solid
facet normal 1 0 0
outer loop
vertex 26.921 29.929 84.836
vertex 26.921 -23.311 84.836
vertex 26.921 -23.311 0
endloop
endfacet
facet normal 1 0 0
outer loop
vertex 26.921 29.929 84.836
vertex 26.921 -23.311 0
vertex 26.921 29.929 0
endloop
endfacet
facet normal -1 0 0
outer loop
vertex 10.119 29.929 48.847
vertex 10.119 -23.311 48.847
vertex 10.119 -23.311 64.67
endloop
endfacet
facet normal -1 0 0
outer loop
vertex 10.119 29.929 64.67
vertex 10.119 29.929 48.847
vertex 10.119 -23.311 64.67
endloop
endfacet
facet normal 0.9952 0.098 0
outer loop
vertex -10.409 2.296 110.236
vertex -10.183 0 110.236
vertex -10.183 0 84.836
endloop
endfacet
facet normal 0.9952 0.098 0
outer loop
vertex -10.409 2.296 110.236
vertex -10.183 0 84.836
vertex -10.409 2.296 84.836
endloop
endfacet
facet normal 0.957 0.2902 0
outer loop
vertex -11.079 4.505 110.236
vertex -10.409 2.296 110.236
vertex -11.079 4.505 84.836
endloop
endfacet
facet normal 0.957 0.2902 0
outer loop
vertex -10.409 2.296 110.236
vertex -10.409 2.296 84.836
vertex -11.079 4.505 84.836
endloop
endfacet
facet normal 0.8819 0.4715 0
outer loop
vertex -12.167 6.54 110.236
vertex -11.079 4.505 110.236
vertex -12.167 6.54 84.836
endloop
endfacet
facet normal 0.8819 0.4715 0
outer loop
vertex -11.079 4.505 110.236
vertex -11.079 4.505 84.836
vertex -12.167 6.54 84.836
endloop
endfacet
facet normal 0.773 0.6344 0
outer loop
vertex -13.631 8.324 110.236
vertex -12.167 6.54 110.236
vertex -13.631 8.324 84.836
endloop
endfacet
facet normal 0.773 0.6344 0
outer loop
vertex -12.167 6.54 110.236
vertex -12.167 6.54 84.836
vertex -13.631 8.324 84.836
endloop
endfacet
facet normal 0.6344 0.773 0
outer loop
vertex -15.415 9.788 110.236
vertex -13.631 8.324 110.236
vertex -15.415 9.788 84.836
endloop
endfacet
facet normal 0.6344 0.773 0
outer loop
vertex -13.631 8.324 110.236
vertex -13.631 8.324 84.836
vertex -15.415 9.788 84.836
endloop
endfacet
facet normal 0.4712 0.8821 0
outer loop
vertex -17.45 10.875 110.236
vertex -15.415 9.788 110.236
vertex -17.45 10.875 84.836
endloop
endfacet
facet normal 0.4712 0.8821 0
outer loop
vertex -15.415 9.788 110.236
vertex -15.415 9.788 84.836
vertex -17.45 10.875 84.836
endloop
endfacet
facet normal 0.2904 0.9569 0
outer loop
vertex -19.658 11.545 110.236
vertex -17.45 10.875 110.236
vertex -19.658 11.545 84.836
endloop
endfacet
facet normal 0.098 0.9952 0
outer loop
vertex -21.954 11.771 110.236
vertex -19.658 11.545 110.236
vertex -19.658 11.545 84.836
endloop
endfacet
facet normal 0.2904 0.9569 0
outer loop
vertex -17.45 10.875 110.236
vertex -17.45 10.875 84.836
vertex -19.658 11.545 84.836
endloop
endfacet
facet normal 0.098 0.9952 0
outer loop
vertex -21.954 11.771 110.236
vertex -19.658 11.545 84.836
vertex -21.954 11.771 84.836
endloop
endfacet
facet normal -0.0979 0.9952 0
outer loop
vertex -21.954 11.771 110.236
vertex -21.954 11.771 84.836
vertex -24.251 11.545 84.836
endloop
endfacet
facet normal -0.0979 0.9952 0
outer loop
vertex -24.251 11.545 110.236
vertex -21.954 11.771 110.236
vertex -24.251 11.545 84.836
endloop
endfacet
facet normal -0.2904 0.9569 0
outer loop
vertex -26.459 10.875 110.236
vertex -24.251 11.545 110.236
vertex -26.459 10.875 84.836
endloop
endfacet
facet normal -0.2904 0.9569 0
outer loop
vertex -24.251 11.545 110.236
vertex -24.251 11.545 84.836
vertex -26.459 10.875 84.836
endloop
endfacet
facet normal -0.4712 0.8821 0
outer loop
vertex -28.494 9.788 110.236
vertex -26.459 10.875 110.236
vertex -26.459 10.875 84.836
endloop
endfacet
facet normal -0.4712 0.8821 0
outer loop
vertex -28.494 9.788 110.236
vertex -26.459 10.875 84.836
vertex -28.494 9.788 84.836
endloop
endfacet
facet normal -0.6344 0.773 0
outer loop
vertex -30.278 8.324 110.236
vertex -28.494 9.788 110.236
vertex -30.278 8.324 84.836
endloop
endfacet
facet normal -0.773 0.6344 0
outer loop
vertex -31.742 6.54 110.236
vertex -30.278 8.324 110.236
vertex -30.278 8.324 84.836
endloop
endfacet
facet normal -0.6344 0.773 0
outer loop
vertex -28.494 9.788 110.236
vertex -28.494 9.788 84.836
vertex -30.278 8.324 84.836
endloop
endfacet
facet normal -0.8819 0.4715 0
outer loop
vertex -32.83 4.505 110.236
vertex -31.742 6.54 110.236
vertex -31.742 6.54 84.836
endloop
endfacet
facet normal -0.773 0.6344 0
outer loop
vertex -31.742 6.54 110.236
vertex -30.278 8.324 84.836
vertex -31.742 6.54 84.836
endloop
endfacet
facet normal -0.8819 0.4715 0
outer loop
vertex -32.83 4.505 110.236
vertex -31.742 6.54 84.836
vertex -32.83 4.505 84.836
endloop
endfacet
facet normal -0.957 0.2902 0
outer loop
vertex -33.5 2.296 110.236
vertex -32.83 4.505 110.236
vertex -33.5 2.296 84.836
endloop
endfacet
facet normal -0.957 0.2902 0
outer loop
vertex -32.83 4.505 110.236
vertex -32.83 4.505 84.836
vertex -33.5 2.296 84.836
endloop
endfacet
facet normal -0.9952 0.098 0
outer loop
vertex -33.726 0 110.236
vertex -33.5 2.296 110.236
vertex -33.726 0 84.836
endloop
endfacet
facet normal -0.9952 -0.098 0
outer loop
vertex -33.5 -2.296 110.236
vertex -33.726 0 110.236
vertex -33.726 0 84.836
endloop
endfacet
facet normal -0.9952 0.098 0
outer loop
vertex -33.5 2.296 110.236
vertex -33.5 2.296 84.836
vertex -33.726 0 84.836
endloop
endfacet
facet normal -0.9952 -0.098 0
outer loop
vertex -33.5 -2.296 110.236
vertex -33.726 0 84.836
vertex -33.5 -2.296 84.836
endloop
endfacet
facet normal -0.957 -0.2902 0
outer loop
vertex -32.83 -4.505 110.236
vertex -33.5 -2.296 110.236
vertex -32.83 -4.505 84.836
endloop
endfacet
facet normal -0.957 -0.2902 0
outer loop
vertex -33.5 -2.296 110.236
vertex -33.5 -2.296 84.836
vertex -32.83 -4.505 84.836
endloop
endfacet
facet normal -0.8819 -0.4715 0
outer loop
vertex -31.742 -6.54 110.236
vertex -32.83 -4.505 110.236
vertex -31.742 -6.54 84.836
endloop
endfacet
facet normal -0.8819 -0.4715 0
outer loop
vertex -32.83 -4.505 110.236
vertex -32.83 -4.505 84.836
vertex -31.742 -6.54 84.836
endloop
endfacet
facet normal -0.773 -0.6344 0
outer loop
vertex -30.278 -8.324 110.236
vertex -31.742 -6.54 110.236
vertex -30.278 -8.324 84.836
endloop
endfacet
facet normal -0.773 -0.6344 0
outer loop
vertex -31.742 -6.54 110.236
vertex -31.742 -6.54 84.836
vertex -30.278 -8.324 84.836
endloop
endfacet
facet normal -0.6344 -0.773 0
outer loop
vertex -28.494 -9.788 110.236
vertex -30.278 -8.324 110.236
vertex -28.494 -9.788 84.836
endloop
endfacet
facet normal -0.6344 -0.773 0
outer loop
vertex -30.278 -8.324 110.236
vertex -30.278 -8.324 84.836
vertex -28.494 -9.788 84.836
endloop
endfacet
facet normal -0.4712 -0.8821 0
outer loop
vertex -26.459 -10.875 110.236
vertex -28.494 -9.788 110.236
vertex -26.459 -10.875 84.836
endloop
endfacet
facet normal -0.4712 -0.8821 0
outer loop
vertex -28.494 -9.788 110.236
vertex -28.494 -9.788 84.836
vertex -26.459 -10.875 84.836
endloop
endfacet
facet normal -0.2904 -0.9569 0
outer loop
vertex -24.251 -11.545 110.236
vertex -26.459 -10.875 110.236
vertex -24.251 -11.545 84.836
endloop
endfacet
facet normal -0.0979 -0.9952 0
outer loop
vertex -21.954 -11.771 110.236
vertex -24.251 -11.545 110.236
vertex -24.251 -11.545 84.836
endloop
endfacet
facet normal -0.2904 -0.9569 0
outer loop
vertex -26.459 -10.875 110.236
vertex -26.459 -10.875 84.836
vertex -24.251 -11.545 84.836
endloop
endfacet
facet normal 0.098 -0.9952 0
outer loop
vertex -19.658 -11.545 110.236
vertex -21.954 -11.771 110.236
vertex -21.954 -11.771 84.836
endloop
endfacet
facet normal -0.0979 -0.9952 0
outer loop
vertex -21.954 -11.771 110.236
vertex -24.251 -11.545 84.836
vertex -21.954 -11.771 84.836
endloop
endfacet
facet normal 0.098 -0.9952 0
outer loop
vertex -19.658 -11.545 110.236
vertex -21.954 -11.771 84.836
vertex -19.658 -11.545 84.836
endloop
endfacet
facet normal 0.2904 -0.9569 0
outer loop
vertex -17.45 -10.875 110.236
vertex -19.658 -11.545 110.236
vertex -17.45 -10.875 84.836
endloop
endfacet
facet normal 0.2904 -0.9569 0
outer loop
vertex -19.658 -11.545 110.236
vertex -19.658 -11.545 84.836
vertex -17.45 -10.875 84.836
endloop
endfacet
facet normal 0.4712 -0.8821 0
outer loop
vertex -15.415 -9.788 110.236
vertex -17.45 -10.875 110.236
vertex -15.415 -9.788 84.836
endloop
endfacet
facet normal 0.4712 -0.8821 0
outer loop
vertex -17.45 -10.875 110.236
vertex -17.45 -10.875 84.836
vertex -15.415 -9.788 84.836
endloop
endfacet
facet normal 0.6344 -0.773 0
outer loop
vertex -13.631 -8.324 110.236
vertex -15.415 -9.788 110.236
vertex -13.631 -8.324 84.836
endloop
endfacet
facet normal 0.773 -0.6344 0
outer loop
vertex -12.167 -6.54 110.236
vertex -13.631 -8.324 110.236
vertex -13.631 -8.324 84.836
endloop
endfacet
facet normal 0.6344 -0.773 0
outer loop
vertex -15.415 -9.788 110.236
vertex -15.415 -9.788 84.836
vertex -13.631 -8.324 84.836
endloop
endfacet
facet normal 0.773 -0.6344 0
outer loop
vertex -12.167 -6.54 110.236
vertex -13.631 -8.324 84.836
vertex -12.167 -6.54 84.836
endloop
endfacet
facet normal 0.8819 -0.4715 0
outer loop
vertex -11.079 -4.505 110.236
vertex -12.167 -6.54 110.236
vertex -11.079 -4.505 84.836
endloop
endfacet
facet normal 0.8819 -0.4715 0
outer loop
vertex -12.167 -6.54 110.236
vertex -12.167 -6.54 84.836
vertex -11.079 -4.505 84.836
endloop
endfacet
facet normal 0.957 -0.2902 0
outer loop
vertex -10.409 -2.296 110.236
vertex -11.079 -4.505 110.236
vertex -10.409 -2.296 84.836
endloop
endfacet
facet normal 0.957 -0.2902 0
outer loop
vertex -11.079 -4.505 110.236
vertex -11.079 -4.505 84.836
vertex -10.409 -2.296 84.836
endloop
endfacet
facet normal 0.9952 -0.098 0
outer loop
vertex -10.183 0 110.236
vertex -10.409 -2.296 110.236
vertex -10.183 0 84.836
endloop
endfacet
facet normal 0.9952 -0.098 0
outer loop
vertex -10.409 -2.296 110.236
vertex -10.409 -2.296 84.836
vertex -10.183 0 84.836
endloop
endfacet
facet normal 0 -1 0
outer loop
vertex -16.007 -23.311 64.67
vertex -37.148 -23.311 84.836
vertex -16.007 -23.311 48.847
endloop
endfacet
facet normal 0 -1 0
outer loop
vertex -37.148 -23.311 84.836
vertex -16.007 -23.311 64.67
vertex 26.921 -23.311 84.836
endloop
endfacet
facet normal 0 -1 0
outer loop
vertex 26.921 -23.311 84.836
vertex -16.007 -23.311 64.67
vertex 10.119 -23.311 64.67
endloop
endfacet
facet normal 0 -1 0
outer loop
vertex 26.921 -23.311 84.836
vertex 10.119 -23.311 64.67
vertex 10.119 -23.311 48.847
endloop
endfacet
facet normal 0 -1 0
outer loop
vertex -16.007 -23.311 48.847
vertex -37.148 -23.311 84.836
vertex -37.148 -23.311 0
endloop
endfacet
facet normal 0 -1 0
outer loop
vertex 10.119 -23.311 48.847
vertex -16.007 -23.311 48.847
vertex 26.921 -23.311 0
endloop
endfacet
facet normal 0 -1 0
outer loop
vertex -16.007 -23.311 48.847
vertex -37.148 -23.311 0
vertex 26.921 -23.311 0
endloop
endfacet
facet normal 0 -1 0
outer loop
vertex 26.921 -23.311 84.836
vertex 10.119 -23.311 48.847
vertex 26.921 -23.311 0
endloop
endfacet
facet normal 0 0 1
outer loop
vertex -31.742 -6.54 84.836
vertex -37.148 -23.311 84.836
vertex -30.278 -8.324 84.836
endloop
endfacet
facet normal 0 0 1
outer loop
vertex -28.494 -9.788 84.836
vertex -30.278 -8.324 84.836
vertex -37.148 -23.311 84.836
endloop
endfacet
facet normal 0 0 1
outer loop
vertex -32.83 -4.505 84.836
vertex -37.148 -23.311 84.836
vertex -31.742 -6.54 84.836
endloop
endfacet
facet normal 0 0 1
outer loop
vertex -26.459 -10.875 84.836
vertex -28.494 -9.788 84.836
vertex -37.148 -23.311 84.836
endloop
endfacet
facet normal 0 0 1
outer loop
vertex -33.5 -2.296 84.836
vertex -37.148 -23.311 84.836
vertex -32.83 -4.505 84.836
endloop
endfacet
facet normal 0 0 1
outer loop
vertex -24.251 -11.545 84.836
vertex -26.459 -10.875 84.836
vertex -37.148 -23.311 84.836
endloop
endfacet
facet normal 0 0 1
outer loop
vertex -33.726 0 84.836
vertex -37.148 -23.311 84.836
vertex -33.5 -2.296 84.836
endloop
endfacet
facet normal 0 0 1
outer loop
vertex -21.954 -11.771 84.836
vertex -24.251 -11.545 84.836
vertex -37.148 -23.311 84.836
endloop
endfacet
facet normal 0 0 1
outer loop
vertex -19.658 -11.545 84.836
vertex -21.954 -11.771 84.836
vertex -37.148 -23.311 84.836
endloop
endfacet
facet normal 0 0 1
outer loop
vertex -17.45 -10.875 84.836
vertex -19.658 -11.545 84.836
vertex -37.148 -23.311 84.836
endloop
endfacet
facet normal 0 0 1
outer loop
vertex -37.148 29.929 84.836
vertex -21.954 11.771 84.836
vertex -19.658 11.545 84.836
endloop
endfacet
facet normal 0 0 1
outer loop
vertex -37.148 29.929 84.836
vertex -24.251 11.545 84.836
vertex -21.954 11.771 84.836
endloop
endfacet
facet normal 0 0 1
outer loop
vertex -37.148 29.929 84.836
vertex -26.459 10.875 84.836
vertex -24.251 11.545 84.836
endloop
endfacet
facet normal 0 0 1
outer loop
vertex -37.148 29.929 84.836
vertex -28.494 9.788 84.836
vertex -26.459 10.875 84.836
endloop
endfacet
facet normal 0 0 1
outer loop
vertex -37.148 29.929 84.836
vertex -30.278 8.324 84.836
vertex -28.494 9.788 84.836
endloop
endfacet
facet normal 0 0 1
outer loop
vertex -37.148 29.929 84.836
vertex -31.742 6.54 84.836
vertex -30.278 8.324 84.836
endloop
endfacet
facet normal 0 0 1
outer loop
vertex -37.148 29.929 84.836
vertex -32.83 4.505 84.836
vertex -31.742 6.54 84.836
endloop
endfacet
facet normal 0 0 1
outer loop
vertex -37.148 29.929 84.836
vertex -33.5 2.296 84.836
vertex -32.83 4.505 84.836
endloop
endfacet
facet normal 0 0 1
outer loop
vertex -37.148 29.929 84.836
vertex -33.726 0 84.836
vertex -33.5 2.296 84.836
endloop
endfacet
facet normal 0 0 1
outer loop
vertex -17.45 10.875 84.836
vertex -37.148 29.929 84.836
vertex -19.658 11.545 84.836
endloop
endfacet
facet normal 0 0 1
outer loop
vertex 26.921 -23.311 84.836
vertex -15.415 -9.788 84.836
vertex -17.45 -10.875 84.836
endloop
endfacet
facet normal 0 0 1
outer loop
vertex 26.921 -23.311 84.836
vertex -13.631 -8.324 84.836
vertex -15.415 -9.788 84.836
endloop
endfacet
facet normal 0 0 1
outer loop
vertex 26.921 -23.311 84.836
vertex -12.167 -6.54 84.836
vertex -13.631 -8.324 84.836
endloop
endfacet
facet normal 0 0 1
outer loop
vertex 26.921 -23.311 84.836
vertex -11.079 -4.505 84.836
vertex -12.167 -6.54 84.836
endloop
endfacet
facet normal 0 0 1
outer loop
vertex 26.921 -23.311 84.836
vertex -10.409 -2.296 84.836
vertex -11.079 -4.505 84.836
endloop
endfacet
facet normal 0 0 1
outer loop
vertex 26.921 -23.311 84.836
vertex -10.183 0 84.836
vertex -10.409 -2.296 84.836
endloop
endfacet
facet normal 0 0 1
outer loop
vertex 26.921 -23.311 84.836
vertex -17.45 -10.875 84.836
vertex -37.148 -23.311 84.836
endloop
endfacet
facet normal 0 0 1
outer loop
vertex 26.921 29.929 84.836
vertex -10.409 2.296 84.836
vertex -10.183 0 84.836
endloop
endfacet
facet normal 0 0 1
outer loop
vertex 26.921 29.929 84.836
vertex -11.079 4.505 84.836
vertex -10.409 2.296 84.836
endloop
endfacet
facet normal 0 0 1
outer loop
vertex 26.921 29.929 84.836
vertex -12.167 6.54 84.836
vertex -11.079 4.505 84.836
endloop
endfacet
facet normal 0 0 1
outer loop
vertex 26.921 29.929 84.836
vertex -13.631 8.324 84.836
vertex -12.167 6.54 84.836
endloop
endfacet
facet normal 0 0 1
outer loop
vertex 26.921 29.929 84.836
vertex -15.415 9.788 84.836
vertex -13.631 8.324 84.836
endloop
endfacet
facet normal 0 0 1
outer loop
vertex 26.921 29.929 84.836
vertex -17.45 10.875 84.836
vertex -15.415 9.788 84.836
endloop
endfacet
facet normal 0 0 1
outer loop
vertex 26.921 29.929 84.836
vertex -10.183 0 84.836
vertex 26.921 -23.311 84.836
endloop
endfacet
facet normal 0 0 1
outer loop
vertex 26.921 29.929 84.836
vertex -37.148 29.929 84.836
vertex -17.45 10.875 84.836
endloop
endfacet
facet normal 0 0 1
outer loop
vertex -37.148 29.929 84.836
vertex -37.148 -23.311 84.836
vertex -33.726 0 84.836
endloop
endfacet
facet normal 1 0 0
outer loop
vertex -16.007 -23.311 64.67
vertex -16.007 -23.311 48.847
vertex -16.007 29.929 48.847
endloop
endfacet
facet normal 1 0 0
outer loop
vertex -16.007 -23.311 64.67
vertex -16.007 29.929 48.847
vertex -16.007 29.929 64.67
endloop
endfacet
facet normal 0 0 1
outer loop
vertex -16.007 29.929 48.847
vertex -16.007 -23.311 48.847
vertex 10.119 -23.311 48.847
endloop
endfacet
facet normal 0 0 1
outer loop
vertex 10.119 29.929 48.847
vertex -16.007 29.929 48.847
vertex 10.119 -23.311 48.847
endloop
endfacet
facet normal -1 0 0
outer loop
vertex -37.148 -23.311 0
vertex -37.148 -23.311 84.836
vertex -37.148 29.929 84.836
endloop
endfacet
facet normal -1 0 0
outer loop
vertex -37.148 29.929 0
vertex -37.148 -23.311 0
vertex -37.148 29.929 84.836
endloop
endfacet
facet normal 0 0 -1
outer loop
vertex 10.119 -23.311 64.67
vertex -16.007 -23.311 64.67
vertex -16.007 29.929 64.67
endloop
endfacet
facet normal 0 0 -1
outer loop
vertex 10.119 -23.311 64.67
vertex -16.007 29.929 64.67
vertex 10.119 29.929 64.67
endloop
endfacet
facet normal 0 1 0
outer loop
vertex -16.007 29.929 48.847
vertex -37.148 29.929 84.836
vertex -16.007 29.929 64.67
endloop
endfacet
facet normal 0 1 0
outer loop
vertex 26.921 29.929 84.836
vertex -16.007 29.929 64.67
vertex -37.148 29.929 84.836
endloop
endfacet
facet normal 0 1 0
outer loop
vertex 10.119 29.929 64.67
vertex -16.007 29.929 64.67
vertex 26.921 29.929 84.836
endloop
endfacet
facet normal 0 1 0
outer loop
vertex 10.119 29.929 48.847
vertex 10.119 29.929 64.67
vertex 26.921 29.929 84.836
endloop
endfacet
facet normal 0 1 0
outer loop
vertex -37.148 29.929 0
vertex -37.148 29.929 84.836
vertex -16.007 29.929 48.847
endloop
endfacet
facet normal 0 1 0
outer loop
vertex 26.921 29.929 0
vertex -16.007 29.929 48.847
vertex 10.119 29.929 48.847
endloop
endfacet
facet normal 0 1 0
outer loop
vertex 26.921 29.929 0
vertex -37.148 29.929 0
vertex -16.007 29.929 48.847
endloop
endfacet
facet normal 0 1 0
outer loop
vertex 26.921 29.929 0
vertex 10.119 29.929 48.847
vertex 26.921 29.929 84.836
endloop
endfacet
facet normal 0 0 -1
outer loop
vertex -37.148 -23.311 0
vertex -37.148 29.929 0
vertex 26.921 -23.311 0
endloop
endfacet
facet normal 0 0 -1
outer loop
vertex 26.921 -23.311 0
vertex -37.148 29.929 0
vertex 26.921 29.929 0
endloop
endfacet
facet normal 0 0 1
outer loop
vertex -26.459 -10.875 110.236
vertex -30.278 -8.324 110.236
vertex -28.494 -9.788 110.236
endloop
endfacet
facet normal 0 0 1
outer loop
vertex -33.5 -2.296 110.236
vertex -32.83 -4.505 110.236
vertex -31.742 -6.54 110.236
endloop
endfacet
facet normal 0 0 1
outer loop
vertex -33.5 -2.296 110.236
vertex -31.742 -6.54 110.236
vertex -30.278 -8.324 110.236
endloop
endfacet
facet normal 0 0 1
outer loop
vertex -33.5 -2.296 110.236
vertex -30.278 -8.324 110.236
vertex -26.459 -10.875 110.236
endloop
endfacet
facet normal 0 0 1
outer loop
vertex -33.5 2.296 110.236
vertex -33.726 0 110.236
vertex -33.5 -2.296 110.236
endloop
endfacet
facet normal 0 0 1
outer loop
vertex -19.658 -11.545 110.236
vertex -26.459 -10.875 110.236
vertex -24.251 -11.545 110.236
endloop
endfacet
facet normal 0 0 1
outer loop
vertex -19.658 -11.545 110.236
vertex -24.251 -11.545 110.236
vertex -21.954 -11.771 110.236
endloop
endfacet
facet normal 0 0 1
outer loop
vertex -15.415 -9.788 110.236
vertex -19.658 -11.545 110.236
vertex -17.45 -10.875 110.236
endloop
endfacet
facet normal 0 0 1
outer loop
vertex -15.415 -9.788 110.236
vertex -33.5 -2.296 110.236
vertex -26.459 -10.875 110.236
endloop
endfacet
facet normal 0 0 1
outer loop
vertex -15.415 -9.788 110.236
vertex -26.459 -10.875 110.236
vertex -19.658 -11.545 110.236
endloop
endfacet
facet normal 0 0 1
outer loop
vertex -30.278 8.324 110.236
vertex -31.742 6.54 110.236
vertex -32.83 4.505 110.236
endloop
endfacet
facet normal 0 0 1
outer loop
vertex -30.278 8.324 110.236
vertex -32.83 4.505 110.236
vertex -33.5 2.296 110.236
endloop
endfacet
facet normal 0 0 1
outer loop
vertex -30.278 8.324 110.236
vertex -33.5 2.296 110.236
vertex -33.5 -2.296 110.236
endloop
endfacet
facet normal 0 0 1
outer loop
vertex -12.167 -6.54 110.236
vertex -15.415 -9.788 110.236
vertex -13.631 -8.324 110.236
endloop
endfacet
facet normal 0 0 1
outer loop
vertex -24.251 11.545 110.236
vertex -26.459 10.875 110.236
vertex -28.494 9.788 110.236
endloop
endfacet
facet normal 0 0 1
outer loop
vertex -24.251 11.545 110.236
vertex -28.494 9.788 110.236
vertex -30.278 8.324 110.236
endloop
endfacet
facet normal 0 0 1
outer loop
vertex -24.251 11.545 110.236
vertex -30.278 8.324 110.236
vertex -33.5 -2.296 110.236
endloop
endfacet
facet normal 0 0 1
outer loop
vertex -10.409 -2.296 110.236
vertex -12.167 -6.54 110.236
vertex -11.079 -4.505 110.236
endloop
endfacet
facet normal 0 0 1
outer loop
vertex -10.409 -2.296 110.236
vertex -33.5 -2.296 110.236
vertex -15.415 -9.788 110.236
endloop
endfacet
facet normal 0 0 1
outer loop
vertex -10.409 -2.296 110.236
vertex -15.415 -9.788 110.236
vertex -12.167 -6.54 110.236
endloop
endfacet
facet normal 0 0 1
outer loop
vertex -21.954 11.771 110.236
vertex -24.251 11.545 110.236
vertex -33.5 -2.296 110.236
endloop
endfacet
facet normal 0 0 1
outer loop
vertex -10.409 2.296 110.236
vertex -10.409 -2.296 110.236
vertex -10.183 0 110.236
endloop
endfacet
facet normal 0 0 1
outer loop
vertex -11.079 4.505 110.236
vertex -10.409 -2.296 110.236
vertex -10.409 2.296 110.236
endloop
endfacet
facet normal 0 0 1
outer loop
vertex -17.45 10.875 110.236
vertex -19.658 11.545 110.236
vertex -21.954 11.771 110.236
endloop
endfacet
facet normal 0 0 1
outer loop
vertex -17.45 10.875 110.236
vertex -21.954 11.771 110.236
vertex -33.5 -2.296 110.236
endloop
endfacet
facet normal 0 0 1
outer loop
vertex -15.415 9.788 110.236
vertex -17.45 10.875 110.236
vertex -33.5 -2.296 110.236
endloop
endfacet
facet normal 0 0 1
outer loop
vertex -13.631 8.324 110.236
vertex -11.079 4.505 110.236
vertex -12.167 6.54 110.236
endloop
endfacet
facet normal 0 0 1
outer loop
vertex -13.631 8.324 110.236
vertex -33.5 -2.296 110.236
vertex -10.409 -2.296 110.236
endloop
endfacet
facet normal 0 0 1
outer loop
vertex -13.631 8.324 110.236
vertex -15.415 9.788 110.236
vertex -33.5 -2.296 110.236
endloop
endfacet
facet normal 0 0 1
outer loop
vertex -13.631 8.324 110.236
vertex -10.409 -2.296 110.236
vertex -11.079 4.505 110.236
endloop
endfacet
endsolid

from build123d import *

# Parameters (mm, degrees)
F0_W     = 64.068158
F0_H     = 53.239739
F1_DEPTH = 84.836
F2_R     = 11.771363
F3_DEPTH = 25.4
F4_W     = 26.12557
F4_H     = 15.822526
F5_DEPTH = 82.55


with BuildPart() as f1:
    # F0 (on Top) → F1 (new body)
    with BuildSketch(Plane.XY):
        with Locations((-5.113421, 3.308685)):
            Rectangle(F0_W, F0_H)
    extrude(amount=F1_DEPTH)

    # F2 (on face) → F3 (join)
    with BuildSketch(Plane.XY.offset(84.836)):
        with Locations((-21.954449, 0)):
            Circle(F2_R)
    extrude(amount=F3_DEPTH)

    # F4 (on face) → F5 (cut)
    with BuildSketch(Plane.XZ.offset(23.311185)):
        with Locations((-2.943726, 56.758301)):
            Rectangle(F4_W, F4_H)
    extrude(amount=-F5_DEPTH, mode=Mode.SUBTRACT)


solid = f1.part
